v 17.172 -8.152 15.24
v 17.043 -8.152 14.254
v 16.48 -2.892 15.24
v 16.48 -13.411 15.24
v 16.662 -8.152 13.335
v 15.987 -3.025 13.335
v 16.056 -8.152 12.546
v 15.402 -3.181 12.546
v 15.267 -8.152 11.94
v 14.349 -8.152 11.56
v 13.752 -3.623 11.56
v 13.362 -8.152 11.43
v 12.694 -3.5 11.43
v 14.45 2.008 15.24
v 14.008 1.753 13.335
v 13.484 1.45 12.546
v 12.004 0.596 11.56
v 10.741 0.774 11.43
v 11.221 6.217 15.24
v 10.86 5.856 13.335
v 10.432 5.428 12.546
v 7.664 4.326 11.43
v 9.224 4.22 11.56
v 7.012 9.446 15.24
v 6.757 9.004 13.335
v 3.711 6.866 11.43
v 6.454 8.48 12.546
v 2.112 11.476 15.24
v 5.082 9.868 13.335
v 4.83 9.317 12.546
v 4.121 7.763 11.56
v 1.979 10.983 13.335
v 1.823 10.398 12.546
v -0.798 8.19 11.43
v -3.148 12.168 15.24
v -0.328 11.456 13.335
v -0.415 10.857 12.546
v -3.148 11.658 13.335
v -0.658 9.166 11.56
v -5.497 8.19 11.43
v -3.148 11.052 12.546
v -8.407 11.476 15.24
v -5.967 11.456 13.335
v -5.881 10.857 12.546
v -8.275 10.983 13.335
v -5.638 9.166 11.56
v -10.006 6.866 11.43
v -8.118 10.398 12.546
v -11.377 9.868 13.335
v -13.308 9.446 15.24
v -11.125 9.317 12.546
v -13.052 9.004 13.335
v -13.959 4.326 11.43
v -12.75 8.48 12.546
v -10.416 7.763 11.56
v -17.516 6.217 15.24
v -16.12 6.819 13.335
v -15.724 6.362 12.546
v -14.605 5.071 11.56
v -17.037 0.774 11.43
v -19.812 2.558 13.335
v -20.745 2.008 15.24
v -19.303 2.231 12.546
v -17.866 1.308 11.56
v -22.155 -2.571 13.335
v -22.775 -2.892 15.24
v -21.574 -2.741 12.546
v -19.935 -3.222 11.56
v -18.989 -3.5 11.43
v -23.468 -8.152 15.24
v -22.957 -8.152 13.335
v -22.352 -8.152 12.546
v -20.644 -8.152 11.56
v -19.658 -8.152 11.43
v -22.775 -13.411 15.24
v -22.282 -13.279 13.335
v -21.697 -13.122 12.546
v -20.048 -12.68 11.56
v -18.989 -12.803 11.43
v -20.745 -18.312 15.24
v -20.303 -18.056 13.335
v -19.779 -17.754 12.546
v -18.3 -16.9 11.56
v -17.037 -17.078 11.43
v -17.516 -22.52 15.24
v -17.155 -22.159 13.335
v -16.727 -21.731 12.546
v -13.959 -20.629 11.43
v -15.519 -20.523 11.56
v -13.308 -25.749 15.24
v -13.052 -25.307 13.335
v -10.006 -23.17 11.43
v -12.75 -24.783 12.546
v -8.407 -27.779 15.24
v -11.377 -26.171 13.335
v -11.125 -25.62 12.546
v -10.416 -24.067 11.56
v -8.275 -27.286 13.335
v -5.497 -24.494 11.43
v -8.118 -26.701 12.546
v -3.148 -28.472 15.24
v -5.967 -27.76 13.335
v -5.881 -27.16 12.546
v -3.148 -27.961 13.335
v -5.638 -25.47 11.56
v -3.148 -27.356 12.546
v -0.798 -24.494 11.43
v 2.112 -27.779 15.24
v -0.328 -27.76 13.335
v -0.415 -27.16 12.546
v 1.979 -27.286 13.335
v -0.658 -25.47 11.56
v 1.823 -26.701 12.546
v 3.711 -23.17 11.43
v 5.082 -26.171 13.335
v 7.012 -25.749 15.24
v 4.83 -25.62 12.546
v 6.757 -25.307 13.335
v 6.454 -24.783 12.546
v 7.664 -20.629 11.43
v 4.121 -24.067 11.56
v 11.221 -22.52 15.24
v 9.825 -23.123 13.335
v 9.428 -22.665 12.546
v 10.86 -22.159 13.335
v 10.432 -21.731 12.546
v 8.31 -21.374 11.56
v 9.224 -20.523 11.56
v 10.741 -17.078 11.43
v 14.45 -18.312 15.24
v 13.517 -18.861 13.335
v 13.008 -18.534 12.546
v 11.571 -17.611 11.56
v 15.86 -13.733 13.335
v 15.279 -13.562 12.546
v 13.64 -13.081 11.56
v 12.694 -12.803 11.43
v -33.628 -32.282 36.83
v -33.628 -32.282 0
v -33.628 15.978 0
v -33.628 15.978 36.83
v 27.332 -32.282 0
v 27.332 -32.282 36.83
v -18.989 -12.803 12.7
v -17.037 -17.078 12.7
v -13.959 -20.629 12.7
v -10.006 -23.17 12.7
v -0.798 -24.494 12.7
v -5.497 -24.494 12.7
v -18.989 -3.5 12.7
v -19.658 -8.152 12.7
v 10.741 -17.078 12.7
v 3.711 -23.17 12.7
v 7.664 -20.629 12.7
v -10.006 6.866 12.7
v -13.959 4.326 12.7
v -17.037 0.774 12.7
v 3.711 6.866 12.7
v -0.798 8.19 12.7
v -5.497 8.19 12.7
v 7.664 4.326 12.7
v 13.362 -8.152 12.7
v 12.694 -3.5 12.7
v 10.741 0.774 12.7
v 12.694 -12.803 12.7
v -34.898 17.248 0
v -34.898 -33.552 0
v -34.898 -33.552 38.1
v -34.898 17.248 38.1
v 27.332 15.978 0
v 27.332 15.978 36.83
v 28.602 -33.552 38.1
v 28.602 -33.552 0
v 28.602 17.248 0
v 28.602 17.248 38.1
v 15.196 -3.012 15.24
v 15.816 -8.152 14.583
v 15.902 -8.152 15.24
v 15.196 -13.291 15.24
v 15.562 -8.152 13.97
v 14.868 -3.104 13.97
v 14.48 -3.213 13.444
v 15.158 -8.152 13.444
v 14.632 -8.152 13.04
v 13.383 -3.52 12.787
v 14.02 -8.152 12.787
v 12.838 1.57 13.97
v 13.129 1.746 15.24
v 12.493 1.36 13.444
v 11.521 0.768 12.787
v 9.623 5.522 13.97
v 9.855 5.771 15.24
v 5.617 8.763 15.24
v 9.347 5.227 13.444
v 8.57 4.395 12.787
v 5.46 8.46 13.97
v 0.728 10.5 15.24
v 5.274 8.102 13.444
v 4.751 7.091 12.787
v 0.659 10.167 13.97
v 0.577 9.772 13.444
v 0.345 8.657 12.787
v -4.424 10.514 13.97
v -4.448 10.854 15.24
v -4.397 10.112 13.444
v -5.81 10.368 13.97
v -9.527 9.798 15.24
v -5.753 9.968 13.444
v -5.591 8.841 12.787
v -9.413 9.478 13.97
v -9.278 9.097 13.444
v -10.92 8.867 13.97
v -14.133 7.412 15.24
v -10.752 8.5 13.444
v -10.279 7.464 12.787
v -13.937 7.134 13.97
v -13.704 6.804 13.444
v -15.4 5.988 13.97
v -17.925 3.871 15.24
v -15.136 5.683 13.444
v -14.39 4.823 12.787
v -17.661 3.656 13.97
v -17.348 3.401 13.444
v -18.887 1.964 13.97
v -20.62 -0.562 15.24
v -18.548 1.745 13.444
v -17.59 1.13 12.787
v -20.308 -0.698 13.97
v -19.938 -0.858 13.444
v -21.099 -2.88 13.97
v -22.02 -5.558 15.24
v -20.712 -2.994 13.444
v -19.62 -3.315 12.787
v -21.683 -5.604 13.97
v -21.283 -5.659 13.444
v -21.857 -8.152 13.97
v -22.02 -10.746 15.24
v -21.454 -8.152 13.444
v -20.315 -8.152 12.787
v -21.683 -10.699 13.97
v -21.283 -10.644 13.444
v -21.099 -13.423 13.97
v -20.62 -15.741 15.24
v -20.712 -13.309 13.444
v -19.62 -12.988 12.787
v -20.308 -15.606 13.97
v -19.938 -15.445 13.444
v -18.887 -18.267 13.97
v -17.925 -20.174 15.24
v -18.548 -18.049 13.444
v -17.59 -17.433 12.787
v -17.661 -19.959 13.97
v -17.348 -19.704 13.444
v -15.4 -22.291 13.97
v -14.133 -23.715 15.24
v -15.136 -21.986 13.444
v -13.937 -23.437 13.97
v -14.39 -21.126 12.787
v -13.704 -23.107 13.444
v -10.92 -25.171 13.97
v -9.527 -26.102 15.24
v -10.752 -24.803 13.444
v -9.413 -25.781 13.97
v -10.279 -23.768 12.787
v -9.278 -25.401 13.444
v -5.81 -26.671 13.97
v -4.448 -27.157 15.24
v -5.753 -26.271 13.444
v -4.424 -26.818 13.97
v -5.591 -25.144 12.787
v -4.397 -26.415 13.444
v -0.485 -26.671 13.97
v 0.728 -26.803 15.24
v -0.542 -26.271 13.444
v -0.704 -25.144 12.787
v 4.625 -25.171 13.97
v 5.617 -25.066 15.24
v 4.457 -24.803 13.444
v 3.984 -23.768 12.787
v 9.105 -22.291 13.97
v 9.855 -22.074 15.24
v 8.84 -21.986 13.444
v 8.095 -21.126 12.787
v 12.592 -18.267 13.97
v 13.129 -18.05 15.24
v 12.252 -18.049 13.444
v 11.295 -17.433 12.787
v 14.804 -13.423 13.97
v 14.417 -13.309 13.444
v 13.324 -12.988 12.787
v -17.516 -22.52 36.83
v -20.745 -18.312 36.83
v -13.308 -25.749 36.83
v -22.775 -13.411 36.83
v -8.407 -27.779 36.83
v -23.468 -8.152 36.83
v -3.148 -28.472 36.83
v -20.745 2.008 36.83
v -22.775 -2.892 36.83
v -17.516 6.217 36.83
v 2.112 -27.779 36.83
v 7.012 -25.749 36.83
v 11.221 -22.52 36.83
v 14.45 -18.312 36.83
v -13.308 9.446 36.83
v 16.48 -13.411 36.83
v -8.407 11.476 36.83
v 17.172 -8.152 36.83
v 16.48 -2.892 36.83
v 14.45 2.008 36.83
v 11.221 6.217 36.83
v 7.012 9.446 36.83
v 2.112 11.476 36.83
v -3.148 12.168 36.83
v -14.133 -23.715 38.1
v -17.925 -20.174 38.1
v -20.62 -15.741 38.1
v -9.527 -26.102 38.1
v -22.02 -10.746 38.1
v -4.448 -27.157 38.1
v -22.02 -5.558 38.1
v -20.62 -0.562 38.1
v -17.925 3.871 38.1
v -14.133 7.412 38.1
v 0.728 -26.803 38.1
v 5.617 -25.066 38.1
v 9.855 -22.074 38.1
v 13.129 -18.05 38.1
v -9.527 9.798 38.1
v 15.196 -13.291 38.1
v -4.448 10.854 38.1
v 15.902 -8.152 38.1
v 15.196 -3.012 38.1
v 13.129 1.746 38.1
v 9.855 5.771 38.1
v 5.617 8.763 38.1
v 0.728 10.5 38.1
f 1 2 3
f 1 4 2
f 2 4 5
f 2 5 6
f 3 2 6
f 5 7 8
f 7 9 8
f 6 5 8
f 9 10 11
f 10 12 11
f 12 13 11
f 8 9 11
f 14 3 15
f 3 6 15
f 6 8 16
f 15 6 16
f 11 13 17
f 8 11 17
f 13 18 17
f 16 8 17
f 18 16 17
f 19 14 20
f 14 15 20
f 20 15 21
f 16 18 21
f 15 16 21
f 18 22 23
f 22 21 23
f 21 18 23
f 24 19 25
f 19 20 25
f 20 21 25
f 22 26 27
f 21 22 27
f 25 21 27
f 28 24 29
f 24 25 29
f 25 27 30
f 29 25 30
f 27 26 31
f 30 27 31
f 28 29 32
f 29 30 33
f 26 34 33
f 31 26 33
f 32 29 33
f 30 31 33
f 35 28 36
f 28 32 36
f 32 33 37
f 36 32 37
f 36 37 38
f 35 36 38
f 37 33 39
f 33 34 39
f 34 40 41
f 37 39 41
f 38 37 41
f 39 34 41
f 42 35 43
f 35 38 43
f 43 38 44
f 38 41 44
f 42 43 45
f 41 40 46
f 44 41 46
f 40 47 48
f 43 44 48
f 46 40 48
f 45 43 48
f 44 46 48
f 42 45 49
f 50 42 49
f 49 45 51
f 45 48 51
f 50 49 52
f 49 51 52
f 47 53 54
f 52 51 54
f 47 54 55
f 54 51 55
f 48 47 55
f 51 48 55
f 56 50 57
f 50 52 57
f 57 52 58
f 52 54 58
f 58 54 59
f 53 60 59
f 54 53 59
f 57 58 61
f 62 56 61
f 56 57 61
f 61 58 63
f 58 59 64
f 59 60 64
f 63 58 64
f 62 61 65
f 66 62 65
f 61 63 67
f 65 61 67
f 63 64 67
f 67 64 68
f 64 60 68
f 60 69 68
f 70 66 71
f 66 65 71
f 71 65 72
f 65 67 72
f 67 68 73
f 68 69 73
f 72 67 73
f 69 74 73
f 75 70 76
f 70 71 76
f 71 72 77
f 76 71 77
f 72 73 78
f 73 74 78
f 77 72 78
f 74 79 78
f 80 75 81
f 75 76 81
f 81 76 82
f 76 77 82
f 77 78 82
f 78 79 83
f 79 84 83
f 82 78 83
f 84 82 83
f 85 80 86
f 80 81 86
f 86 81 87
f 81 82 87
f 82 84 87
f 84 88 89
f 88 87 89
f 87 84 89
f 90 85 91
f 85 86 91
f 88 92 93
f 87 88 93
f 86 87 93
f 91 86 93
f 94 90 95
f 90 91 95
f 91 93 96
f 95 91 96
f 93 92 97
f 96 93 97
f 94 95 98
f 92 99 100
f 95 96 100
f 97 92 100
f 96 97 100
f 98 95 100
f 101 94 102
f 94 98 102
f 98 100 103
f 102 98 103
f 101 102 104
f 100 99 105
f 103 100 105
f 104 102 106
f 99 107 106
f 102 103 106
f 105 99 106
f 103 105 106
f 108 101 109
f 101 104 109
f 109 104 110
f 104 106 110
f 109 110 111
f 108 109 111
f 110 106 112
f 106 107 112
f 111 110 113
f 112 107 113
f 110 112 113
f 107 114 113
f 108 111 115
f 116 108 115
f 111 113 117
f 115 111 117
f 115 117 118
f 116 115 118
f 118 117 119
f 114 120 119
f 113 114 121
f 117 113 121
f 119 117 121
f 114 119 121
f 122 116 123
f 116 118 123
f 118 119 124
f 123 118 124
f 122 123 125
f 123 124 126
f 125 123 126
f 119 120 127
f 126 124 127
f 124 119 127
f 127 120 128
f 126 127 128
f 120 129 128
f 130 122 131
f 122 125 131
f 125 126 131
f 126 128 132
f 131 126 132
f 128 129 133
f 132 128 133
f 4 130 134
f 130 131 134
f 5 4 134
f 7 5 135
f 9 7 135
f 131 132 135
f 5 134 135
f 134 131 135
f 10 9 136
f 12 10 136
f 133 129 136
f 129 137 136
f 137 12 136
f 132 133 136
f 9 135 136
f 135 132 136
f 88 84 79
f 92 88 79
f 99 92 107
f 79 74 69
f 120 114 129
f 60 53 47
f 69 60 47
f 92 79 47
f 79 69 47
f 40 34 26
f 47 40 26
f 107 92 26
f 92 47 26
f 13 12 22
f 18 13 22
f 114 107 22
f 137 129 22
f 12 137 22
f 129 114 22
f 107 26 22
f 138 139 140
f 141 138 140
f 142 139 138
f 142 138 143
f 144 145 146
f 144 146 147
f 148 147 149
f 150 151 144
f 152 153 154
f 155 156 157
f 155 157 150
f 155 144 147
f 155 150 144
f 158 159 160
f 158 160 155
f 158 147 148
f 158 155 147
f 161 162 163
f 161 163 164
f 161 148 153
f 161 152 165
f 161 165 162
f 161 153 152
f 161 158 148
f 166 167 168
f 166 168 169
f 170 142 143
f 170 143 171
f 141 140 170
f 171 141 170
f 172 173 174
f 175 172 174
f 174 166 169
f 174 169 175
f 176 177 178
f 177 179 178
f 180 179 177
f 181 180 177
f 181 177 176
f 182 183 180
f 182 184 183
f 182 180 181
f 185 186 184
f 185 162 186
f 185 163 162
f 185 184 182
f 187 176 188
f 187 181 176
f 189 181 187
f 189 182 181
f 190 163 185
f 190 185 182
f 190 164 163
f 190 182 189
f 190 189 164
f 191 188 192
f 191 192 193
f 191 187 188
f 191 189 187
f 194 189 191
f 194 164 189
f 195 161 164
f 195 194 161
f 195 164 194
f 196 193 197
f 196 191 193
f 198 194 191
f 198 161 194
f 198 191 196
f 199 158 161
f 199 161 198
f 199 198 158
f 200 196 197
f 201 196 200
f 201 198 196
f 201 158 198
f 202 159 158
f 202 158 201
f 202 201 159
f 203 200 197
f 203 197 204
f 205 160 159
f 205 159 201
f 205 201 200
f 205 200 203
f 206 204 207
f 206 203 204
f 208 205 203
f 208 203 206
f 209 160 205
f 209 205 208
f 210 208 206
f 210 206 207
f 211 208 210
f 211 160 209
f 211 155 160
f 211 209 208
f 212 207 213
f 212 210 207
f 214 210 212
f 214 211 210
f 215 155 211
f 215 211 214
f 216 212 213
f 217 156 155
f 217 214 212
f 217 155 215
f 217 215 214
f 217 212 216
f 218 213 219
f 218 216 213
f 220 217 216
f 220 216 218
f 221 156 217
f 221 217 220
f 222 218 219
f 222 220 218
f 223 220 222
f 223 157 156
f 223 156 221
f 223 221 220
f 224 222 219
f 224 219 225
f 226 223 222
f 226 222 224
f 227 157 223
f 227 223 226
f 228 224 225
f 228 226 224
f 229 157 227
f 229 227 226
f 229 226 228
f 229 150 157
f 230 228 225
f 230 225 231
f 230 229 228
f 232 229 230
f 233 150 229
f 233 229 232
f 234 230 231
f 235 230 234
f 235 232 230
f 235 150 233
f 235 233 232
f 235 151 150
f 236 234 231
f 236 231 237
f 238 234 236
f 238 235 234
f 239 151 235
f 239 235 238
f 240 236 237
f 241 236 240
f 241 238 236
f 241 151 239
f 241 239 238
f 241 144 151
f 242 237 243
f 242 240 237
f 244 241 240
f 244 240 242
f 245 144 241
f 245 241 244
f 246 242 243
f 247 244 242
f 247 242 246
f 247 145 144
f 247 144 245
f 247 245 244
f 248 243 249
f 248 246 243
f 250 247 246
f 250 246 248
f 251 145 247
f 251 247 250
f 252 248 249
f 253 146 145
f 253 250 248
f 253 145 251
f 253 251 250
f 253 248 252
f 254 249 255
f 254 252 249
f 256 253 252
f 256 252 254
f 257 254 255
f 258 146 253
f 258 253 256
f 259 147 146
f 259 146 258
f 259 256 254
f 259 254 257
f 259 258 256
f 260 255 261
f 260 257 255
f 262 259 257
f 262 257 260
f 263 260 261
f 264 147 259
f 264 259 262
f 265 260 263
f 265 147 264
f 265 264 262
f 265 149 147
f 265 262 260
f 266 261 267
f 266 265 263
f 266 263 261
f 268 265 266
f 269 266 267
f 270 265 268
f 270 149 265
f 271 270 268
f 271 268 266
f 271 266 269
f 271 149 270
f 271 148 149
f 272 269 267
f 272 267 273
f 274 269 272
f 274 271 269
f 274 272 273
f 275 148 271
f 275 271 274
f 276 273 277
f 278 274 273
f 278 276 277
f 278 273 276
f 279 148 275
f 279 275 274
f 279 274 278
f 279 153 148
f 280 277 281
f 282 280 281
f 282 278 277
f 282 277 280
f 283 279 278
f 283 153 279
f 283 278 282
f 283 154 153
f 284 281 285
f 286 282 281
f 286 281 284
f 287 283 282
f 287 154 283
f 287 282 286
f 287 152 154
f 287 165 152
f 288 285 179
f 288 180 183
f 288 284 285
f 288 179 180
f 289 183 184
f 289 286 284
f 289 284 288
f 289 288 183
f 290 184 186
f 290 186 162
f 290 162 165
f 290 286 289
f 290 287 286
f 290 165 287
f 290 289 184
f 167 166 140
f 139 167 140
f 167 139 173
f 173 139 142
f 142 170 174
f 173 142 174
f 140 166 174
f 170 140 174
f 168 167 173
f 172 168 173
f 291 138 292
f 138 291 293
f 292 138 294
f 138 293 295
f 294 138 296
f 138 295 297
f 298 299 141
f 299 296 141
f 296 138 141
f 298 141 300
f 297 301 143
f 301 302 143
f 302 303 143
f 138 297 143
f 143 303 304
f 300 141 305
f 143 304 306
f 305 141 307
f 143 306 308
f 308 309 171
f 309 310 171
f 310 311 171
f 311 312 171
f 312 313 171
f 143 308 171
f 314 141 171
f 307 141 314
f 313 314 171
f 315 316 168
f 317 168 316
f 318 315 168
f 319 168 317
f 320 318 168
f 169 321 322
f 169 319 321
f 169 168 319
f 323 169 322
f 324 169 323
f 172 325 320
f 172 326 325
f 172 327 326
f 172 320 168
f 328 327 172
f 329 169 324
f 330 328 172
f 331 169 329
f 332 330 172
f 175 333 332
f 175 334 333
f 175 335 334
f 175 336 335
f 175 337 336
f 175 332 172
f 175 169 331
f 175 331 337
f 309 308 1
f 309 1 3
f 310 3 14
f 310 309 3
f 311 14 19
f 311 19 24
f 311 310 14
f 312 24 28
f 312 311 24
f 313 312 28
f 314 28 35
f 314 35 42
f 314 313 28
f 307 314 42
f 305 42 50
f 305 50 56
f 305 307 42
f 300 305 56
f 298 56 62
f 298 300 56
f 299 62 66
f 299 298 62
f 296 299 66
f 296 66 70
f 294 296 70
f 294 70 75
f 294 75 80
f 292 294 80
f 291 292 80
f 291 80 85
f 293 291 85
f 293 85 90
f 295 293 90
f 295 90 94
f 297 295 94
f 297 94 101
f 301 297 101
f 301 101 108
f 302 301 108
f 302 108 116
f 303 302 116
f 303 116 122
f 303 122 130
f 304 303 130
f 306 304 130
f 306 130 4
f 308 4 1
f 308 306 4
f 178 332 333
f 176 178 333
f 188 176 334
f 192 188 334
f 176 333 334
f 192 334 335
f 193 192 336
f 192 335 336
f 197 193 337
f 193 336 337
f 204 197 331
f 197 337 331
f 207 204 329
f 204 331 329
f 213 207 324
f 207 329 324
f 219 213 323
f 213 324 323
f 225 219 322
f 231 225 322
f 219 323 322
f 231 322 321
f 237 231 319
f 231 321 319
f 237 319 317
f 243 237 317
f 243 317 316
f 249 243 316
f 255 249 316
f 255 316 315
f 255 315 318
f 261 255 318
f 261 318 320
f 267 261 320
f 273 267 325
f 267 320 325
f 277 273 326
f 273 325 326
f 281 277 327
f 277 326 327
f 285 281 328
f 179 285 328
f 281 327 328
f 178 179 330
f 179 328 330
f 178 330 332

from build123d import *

# Parameters (mm, degrees)
F0_W     = 63.5
F0_H     = 50.8
F1_DEPTH = 38.1
F2_R     = 19.05
F3_DEPTH = 25.4
F4_R     = 2.54
F5_T     = -1.27


with BuildPart() as f1:
    # F0 (on Top) → F1 (new body)
    with BuildSketch(Plane.XY):
        with Locations((-3.1476, -8.151593)):
            Rectangle(F0_W, F0_H)
    extrude(amount=F1_DEPTH)

    # F2 (on face) → F3 (cut)
    with BuildSketch(Plane.XY.offset(38.1)):
        with Locations((-3.1476, -8.151593)):
            Circle(F2_R)
    extrude(amount=-F3_DEPTH, mode=Mode.SUBTRACT)

    # F4
    f4_edges = [f1.edges().sort_by_distance(p)[0] for p in [
        (-22.1976, -8.151593, 12.7),
    ]]
    fillet(f4_edges, radius=F4_R)

    # F5
    f5_openings = [f1.faces().sort_by_distance(p)[0] for p in [
        (-3.1476, -8.151593, 0),
    ]]
    offset(amount=F5_T, openings=f5_openings)


solid = f1.part
